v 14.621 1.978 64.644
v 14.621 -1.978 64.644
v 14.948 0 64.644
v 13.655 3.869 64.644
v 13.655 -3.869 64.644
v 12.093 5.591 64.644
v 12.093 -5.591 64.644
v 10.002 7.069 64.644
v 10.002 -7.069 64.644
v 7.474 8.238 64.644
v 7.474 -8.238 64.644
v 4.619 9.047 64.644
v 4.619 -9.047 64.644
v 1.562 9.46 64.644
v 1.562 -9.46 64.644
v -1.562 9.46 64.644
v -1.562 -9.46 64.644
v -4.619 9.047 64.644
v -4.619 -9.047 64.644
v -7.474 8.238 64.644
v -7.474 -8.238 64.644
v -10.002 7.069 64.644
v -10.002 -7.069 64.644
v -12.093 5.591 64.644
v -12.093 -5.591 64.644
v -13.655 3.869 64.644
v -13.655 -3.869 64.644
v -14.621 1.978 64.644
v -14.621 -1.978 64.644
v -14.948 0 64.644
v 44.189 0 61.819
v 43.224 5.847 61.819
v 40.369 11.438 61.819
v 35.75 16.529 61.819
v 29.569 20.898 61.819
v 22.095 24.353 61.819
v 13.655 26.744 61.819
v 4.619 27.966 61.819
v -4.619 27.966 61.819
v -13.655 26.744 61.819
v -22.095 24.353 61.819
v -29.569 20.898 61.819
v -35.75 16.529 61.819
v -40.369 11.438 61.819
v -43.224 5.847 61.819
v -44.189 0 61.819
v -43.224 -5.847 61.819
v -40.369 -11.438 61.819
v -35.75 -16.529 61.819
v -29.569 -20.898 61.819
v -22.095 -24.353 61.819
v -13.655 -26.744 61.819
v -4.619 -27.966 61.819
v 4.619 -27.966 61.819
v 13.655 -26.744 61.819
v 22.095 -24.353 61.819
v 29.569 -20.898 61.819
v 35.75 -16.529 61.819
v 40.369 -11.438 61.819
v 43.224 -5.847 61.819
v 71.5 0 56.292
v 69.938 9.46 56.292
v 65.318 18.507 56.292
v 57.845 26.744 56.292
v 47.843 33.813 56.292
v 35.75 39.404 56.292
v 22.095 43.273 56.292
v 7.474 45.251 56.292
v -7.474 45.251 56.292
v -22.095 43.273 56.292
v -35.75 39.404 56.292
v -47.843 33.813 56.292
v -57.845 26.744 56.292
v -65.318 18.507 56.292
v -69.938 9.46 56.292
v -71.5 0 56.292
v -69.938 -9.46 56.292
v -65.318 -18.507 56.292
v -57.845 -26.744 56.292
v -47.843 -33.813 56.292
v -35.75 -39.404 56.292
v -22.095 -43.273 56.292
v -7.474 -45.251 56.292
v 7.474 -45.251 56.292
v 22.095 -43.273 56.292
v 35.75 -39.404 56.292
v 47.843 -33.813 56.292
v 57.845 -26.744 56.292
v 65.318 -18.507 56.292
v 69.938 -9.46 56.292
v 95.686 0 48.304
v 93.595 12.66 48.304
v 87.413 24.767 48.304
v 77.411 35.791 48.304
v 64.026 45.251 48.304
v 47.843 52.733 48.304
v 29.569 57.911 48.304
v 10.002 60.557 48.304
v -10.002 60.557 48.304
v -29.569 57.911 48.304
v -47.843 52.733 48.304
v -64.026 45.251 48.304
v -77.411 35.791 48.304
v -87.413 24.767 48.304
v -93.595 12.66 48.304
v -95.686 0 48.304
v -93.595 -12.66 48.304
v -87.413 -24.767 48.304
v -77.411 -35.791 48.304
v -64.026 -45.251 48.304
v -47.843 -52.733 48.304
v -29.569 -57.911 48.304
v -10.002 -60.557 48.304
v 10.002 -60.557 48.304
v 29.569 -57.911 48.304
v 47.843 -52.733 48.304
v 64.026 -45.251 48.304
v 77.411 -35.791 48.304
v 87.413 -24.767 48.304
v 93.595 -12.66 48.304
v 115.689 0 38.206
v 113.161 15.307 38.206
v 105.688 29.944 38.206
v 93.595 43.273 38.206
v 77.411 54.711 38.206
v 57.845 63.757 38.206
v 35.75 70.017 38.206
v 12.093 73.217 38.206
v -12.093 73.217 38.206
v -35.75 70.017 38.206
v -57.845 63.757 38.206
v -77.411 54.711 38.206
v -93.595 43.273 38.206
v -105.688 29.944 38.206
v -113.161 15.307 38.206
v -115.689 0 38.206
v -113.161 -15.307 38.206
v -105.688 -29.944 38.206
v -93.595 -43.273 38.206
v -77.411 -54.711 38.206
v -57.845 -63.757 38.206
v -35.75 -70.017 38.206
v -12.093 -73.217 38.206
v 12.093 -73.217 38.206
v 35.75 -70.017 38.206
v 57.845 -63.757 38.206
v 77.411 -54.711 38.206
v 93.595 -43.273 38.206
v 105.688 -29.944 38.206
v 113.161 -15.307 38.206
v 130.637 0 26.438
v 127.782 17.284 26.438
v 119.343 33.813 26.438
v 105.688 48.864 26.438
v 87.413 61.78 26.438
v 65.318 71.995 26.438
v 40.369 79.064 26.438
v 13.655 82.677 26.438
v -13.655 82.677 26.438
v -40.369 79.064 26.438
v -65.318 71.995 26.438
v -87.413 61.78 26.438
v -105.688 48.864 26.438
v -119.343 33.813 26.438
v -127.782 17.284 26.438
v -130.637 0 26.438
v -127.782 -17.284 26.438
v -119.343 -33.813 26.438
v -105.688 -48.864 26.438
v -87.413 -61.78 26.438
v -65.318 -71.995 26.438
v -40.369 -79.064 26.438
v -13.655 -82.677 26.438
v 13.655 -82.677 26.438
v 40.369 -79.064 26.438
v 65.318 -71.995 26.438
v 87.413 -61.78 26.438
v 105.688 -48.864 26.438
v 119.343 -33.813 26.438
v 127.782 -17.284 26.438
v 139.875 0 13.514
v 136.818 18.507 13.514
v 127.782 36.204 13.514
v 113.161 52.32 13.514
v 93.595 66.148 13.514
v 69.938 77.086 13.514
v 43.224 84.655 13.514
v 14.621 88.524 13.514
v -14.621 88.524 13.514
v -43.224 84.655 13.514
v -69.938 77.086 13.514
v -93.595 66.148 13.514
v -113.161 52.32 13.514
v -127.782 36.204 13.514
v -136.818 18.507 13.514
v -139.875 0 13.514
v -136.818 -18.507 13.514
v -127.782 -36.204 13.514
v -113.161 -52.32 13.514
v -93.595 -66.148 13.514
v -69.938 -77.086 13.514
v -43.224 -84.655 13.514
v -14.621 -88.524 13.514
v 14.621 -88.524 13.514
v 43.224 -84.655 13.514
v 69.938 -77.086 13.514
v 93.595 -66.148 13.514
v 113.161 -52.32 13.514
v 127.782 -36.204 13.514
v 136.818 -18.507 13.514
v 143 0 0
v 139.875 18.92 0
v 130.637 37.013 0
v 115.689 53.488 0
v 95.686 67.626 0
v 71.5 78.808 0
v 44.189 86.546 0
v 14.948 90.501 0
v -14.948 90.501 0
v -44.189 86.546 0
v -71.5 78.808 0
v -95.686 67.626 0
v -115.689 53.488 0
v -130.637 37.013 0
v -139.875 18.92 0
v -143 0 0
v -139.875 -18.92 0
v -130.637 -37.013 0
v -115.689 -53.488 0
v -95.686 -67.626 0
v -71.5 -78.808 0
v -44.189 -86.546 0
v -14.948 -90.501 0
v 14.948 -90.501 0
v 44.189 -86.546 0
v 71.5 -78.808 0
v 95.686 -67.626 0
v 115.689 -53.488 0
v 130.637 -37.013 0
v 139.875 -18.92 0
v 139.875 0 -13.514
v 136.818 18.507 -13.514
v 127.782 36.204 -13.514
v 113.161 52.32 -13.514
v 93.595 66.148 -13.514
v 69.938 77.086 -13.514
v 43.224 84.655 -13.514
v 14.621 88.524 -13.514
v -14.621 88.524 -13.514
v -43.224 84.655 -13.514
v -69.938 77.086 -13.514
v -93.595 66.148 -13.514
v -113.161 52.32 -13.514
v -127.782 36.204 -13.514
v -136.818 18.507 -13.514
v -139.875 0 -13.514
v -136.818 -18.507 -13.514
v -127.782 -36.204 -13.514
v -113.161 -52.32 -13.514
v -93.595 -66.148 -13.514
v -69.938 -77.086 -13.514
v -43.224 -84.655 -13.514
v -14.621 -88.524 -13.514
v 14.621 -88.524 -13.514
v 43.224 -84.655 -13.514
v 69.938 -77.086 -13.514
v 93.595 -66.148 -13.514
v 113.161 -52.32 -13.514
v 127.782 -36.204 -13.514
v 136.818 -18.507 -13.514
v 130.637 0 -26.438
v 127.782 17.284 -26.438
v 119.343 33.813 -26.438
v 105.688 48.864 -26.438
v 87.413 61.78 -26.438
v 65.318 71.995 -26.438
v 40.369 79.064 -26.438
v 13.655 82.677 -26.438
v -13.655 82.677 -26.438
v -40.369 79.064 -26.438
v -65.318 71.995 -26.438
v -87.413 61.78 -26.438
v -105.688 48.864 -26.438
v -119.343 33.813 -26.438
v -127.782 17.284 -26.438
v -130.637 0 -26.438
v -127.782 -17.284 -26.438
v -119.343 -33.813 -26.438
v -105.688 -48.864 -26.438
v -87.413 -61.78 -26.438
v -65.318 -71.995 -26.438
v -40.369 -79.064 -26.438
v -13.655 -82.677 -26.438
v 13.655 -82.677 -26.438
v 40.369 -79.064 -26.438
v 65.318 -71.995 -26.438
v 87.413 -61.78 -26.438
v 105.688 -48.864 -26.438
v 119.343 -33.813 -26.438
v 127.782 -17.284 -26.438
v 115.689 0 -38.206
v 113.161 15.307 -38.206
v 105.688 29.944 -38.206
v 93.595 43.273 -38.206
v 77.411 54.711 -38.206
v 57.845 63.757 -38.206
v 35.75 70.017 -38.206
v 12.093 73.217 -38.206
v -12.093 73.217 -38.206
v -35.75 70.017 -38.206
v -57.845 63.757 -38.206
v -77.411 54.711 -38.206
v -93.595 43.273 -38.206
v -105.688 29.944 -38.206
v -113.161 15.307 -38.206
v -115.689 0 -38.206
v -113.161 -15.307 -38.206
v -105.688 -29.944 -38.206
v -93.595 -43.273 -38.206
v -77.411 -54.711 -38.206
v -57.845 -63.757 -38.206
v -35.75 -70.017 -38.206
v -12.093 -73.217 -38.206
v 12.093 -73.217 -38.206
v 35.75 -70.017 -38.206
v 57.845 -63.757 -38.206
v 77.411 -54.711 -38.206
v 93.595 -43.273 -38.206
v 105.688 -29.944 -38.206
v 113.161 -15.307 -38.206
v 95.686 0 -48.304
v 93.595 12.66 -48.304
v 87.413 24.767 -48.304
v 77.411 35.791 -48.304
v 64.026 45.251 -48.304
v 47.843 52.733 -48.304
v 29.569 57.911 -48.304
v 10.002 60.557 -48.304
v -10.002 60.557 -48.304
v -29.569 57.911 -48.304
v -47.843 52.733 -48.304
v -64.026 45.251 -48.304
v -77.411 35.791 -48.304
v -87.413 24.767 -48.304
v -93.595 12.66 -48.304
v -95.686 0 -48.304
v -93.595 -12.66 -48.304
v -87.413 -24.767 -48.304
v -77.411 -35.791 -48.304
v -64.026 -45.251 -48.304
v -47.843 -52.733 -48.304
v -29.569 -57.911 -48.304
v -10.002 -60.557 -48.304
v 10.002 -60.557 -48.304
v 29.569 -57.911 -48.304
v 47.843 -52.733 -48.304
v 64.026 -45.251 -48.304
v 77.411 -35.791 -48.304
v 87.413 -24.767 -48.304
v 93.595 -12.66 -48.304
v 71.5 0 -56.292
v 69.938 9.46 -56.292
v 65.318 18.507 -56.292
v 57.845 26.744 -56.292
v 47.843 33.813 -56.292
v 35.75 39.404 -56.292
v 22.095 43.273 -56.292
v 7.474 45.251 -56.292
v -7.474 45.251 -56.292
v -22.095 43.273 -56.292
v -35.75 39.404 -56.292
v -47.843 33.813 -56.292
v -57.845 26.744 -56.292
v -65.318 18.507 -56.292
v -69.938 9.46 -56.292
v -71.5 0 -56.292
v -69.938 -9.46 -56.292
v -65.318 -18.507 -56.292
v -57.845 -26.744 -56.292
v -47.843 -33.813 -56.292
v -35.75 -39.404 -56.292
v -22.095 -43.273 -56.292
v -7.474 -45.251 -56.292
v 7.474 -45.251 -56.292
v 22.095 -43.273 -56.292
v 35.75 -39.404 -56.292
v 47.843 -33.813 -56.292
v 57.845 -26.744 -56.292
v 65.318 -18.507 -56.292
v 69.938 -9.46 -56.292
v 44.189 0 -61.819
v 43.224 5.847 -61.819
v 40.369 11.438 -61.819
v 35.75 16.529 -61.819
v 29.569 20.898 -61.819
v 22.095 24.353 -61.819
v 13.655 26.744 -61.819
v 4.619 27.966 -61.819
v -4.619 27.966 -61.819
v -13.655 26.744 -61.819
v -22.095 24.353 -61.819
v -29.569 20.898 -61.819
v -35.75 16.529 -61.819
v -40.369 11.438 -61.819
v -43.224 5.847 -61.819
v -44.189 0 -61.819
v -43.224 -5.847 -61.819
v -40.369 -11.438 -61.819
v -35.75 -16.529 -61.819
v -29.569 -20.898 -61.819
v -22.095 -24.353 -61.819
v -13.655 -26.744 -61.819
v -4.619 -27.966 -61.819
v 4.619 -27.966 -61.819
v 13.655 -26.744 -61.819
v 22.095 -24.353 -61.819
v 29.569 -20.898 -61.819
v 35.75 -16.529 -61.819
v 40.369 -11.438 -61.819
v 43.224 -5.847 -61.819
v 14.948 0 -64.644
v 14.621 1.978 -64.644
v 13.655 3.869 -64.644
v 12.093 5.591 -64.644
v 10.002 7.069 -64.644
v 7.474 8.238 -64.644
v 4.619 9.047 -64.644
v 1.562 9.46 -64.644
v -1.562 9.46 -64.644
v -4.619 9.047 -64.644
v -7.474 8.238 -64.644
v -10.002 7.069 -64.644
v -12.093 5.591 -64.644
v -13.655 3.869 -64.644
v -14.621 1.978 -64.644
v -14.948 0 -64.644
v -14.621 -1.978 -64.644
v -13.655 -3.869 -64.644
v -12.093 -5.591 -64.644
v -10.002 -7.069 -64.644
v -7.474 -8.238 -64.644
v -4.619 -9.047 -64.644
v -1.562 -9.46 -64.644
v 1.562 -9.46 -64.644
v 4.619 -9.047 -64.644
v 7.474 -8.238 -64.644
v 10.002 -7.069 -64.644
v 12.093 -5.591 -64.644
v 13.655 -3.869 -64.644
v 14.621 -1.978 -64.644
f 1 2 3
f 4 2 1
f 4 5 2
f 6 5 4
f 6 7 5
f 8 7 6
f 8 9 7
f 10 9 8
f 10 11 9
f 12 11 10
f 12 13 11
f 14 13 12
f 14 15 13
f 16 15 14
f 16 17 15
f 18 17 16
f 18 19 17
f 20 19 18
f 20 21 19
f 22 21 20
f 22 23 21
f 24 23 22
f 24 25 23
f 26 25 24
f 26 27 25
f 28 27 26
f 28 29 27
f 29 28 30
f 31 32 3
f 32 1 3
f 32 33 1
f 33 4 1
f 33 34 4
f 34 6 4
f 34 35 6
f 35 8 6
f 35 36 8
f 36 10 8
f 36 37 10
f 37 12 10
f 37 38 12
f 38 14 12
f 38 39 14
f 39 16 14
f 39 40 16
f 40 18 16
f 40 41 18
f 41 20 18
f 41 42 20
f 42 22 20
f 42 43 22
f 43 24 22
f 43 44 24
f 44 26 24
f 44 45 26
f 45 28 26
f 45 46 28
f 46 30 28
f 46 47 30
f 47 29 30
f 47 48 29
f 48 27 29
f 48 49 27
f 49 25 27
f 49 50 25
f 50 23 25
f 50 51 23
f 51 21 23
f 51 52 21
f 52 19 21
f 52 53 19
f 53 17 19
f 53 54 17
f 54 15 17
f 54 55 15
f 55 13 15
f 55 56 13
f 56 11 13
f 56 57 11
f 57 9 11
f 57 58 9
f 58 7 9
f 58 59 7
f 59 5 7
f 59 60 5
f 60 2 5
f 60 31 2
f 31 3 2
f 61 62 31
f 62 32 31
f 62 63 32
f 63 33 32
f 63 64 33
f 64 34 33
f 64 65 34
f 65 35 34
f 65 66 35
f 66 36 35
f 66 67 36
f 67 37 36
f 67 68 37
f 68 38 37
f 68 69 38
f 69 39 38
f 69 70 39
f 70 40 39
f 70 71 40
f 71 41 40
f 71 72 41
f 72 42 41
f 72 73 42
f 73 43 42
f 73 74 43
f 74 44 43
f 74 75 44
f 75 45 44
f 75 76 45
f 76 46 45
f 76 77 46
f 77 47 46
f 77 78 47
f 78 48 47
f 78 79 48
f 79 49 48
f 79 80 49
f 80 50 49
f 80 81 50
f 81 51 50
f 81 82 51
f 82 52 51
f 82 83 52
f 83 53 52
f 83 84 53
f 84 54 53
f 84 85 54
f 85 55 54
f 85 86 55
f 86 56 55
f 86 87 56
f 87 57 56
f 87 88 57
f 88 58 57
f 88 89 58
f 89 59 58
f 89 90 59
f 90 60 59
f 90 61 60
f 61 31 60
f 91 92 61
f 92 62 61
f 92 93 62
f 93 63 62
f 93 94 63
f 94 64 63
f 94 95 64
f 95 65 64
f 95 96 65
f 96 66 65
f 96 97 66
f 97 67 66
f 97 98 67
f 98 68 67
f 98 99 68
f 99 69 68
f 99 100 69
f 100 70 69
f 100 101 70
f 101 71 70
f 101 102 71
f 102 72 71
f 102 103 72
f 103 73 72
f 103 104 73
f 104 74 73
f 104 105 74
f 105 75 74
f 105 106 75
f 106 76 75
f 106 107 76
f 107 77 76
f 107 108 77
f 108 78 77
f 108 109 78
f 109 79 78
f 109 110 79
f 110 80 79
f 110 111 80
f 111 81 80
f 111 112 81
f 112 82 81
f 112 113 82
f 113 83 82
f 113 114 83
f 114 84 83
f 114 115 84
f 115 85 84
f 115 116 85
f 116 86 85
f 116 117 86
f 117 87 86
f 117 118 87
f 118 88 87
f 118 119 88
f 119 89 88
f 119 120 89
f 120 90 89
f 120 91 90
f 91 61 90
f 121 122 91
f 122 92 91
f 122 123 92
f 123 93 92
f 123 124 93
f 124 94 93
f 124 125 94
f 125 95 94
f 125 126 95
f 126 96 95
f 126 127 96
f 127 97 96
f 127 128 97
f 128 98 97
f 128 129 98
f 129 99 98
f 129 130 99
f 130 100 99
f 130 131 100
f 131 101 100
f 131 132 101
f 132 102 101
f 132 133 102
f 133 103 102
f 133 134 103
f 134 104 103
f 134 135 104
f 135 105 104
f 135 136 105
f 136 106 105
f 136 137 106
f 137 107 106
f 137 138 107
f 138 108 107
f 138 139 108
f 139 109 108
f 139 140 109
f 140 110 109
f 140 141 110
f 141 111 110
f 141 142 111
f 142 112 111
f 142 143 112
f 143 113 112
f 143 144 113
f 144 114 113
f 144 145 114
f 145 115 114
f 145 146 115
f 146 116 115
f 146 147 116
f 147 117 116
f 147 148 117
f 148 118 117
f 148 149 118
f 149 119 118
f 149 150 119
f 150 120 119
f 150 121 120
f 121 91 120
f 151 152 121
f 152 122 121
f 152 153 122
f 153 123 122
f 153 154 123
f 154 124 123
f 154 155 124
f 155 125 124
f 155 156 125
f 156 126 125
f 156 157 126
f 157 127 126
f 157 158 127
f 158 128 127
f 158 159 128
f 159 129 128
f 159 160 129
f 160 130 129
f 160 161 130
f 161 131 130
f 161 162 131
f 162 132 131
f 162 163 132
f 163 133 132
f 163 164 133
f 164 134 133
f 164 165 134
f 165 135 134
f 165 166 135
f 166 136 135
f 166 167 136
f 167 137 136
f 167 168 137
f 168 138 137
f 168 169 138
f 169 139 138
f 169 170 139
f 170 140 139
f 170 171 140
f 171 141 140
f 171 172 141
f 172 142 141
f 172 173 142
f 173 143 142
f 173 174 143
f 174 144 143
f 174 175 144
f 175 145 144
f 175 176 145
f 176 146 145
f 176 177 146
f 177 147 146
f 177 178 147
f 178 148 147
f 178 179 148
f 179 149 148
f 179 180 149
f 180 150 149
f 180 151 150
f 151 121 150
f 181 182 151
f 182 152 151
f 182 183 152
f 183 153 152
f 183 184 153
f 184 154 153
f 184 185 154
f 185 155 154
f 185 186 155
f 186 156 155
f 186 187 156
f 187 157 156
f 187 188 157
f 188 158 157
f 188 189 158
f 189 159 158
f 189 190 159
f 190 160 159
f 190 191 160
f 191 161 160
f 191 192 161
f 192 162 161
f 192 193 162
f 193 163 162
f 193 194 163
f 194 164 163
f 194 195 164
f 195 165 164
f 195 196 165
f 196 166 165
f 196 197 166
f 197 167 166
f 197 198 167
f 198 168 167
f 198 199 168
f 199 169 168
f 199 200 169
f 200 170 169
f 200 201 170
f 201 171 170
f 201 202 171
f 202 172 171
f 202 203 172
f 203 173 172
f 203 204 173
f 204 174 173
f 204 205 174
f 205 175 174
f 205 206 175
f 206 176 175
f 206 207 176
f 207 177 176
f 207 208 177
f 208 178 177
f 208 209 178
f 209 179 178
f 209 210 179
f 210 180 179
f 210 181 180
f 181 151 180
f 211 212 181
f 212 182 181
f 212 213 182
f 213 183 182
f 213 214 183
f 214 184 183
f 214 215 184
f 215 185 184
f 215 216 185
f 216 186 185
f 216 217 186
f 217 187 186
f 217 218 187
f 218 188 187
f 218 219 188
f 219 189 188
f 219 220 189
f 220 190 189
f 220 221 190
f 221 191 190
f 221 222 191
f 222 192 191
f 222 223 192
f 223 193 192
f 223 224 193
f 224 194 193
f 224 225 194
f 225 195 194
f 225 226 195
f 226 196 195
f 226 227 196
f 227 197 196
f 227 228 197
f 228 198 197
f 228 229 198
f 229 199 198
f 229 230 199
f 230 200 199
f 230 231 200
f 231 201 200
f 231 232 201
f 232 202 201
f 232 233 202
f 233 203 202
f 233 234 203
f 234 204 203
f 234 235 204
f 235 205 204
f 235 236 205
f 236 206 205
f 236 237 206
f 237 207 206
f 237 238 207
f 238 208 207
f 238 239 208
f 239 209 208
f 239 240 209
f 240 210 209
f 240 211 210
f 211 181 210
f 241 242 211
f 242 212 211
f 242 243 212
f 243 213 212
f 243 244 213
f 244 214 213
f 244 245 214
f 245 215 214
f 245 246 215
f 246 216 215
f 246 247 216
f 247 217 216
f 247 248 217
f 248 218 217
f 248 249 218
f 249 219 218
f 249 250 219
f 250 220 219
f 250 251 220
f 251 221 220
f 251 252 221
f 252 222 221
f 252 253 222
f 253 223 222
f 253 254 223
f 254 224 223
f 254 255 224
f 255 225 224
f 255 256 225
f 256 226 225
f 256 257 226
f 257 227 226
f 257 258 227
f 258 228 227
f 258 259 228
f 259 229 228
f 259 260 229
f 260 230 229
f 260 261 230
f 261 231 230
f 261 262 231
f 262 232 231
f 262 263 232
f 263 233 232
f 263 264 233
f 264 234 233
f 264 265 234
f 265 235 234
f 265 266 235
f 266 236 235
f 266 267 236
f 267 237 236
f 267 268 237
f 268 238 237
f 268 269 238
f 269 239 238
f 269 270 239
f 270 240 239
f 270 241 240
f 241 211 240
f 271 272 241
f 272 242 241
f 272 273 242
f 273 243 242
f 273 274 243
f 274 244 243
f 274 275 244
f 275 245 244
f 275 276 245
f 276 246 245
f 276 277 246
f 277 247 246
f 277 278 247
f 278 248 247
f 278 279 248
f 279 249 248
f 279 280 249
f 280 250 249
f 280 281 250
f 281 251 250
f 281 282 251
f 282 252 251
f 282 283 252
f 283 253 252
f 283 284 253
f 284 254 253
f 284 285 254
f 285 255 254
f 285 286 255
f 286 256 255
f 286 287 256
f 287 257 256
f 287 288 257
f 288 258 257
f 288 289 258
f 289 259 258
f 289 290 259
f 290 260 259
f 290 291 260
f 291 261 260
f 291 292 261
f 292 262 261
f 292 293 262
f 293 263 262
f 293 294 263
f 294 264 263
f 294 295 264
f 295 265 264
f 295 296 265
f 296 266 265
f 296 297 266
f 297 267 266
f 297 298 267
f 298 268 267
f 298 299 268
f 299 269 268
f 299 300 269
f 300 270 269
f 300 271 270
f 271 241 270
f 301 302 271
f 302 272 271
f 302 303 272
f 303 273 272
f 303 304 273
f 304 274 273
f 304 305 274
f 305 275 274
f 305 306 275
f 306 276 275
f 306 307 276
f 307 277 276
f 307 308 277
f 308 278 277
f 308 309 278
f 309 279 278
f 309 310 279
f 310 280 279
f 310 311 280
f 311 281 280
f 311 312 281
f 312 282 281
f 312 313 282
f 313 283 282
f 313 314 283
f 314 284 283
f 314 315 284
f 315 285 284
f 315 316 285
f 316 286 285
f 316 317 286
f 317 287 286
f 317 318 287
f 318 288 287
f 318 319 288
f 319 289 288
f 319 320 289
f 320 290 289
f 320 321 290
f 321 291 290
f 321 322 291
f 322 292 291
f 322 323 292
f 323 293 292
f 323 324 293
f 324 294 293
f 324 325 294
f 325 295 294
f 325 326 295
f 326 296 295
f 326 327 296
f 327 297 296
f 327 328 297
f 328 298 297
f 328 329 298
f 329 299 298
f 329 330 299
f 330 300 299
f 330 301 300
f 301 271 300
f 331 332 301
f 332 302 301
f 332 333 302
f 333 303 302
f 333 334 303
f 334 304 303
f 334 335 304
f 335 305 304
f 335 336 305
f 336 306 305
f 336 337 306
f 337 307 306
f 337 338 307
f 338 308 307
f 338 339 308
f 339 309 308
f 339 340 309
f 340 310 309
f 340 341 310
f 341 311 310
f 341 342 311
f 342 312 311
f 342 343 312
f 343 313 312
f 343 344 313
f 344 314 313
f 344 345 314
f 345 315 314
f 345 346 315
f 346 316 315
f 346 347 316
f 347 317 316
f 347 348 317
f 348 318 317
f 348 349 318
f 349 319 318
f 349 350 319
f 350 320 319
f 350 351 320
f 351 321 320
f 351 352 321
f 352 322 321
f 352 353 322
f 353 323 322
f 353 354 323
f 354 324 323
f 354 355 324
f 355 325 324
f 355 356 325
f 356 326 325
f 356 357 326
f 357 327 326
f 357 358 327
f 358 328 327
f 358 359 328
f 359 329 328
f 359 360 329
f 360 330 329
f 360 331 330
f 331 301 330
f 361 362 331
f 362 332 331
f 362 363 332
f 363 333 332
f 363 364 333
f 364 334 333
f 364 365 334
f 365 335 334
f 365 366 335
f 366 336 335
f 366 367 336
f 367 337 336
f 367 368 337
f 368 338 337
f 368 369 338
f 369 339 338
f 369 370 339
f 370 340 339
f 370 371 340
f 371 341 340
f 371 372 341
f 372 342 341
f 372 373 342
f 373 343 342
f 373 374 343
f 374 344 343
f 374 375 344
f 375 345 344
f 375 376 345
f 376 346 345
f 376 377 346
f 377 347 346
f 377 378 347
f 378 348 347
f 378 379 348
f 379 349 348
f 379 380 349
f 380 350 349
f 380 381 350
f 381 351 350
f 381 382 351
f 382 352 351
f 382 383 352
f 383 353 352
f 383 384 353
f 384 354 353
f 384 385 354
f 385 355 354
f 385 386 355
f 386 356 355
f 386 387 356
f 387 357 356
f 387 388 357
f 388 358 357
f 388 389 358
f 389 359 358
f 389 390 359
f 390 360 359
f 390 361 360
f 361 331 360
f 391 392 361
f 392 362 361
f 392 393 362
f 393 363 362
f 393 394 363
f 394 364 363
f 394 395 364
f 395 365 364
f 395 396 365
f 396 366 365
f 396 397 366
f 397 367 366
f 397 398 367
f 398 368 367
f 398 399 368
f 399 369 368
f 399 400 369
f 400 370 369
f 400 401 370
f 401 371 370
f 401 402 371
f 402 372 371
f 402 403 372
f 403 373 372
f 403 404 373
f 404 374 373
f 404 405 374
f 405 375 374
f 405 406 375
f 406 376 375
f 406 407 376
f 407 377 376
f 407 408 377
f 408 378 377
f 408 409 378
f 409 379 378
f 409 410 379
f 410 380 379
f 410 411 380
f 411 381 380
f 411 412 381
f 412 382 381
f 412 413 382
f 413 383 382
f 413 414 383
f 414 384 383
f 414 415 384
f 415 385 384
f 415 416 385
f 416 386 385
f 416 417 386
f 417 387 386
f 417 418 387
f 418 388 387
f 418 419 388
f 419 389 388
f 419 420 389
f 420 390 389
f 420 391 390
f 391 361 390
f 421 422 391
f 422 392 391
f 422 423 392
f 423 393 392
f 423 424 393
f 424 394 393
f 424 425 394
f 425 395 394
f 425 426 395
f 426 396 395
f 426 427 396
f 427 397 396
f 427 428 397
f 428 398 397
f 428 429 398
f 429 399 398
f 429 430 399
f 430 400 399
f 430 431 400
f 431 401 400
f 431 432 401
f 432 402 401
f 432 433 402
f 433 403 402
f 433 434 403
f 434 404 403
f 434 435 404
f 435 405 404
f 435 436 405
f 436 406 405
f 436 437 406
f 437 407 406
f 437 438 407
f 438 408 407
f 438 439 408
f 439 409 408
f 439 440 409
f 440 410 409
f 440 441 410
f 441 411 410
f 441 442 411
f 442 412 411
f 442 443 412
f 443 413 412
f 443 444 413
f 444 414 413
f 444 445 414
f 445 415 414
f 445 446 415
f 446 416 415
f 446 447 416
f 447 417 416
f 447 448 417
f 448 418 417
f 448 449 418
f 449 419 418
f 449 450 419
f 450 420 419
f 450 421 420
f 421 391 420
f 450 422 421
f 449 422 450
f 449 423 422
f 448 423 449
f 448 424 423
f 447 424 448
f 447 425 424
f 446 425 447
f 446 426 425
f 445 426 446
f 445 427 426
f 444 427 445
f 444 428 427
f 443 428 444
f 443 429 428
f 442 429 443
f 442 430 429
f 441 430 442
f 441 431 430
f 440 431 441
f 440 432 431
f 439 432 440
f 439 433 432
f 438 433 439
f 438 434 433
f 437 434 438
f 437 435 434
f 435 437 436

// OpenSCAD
// Generated by SolidPython 1.0.1 on 2020-07-29 00:46:49


scale(v = [11, 7, 5]) {
	sphere(r = 13);
}
/***********************************************
*********      SolidPython code:      **********
************************************************
 
# import packages: SolidPython
from solid import *
from solid.utils import *
from itertools import chain, combinations, permutations


class Resize:

    def __init__(self, scad_file):
        self.scad_file = scad_file
        #self.scad_file = import_scad(scad_file)
        # cone/cylinder param:
        self.r1 = 0
        self.r2 = 0
        self.h = 0
        # rectangular prism param:
        self.w = 0
        self.l = 0
        # ellipse param:
        self.r = 0

    # import OpenScad code (file name corresponds to shape)


    # classify shape + parameters
    def assign(self, param1, param2, param3):
        if self.scad_file == 'cone.scad':
            self.r1 = param1
            self.r2 = param2
            self.h = param3
        elif self.scad_file == 'cylinder.scad':
            self.r1 = param1
            self.r2 = param2
            self.h = param3
        elif self.scad_file == 'rectangularPrism.scad':
            self.h = param1
            self.l = param2
            self.w = param3
        else:
            self.r = param1
            self.h = param2

    # resize parameters
    def iterate(self):
        x = range(3, 20, 2)
        i = 1
        if self.scad_file == 'cone.scad':
            tempList = list(permutations(x, 2))
            for temp in tempList:
                param1 = temp[0]
                param2 = temp[1]
                filepath = 'produced_scad_files/' + 'cone' + str(param1) + '_' + str(param2) + '_' + '.scad'
                scad_render_to_file(cylinder(h=param1, r1=param2, r2=0), filepath)

        elif self.scad_file == 'cylinder.scad':
            tempList = list(permutations(x, 3))
            for temp in tempList:
                param1 = temp[0]
                param2 = temp[1]
                filepath = 'produced_scad_files/' + 'cylinder' + str(param1) + '_' + str(param2) + '_' + '.scad'
                scad_render_to_file(cylinder(h=param1, r1=param2, r2=param2), filepath)

        elif self.scad_file == 'rectangularPrism.scad':
            tempList = list(permutations(x, 3))
            for temp in tempList:
                param1 = temp[0]
                param2 = temp[1]
                param3 = temp[2]
                filepath = 'produced_scad_files/' + 'rectangularPrism' + str(param1) + '_' + str(param2) + '_' + str(
                    param3) + '.scad'
                scad_render_to_file(cube(size=(param1, param2, param3)), filepath)

        elif self.scad_file == 'ellipse.scad':
            tempList = list(permutations(x, 4))
            for temp in tempList:
                param1 = temp[0]
                param2 = temp[1]
                param3 = temp[2]
                param4 = temp[3]
                filepath = 'produced_scad_files/' + 'ellipse' + str(param1) + '_' + str(param2) + '_' + str(param3) + '_' + str(param4) + '.scad'
                scad_render_to_file(scale([param1, param2, param3])(sphere(r=param4)), filepath)

    def render_to_scadfile(self):
        scad_render_to_file(scad, 'example.scad') 
 
************************************************/
